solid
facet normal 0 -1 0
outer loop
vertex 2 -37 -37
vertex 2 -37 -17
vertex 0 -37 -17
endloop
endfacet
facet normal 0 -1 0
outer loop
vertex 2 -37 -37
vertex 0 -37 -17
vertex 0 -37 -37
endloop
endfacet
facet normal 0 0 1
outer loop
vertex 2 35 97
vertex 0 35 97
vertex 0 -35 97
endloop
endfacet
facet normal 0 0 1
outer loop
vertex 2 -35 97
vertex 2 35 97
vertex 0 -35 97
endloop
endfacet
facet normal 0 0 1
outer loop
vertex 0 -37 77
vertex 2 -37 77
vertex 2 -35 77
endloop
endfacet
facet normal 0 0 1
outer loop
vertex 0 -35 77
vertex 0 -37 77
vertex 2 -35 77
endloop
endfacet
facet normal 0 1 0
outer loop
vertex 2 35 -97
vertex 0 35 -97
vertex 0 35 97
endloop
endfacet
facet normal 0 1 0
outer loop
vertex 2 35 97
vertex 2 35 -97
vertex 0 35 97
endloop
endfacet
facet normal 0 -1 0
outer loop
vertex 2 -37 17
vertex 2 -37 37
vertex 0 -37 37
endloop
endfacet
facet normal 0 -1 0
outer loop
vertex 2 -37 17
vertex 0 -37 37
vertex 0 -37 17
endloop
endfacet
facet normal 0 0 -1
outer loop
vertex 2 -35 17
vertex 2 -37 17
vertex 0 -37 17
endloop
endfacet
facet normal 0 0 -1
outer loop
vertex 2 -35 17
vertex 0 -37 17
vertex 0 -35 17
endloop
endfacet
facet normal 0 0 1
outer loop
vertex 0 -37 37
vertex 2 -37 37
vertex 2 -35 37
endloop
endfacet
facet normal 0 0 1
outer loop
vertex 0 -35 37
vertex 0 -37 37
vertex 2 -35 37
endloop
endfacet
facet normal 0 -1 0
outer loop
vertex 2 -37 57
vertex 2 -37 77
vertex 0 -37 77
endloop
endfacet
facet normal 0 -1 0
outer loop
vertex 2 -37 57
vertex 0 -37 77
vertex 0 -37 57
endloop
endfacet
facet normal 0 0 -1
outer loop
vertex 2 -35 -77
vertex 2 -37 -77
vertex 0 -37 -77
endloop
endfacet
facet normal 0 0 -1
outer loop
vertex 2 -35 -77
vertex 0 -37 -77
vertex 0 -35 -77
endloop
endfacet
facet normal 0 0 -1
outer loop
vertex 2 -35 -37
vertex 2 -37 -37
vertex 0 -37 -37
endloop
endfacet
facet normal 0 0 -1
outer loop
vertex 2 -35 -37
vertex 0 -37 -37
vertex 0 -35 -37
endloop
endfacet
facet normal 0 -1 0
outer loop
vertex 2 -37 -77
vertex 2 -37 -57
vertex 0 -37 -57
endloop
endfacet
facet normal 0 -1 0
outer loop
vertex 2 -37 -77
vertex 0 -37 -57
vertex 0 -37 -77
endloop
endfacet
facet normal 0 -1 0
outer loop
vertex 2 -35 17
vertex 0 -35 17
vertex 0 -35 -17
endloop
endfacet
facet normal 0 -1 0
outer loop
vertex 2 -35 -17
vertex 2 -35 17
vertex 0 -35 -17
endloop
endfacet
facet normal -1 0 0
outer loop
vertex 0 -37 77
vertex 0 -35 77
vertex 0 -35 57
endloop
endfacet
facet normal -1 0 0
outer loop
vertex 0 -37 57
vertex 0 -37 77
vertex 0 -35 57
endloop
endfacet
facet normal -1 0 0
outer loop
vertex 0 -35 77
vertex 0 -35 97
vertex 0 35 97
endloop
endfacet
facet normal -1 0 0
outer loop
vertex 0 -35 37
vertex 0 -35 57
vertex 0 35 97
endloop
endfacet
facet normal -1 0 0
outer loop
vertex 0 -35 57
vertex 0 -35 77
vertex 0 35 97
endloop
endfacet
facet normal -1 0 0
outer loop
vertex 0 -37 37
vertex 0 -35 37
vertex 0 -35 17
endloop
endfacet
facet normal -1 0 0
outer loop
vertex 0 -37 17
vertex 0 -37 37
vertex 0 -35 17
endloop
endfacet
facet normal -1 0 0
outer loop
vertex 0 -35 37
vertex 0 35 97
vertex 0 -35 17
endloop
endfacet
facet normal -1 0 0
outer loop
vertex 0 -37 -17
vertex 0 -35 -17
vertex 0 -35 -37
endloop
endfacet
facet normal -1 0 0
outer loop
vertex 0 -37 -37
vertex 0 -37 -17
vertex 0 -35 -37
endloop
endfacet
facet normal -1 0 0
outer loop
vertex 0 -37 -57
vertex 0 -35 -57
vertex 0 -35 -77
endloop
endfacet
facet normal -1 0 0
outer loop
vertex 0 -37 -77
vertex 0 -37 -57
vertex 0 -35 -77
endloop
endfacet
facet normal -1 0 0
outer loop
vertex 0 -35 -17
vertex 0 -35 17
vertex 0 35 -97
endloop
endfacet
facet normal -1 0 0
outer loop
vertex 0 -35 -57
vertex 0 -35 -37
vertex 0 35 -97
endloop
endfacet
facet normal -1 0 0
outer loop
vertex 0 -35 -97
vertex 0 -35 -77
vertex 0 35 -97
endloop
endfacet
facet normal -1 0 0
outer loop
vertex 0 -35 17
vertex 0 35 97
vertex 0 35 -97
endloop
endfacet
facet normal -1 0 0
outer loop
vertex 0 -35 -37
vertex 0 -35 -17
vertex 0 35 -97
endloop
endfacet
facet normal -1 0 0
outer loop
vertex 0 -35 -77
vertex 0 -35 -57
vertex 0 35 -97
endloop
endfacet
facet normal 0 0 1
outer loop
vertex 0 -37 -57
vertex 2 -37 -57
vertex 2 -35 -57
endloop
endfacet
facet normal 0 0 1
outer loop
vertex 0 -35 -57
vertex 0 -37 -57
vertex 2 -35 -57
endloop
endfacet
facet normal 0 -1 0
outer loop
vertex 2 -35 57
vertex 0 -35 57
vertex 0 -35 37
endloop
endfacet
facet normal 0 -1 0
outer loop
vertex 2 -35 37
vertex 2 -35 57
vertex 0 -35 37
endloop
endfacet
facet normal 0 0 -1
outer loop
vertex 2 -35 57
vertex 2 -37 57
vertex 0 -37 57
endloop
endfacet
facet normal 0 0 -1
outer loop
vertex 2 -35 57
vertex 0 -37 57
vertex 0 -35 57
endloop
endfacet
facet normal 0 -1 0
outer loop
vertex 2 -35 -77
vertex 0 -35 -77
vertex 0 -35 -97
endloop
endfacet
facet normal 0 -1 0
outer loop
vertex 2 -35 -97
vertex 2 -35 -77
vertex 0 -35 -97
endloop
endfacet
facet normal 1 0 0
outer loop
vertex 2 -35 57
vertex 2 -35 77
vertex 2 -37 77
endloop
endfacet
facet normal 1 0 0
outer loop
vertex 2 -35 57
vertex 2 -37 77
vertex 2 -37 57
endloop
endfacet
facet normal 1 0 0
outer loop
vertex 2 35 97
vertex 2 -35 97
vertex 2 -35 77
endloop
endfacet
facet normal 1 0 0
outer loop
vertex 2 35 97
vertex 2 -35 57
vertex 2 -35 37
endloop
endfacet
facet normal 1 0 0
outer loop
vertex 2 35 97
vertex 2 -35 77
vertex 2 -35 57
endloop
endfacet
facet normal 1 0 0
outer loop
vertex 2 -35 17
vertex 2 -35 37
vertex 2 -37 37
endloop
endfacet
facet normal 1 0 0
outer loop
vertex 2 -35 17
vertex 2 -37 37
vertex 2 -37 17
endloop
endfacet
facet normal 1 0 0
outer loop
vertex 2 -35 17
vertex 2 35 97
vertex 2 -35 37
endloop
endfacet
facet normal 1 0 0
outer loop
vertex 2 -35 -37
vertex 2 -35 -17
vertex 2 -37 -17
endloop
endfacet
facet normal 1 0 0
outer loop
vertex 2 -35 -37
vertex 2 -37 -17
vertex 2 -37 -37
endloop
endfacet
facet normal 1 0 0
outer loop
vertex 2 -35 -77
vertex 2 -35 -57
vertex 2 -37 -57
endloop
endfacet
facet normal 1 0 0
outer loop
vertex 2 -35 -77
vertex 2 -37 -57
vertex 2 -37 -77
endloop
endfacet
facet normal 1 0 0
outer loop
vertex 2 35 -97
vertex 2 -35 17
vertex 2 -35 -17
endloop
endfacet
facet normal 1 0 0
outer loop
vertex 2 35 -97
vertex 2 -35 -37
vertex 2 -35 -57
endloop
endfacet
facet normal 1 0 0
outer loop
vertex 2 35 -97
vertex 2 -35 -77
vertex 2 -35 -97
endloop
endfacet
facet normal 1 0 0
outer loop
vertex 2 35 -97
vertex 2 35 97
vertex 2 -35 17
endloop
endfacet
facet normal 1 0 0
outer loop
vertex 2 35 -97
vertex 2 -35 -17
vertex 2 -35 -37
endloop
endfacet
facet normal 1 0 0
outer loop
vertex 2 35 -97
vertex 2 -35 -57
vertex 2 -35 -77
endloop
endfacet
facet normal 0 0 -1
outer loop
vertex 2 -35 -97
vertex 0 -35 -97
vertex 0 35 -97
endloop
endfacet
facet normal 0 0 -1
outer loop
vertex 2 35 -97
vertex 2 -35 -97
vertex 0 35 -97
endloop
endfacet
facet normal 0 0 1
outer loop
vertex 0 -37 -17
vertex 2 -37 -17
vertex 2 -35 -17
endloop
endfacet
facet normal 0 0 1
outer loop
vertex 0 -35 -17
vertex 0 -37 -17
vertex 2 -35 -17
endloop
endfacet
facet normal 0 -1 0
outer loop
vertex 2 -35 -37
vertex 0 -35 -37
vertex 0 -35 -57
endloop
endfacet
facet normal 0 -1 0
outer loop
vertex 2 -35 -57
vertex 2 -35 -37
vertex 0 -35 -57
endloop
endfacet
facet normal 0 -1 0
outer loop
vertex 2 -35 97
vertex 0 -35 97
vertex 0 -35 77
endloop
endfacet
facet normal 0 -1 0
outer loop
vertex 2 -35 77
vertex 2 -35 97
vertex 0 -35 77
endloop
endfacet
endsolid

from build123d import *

# Parameters (mm, degrees)
BOSS_EXTRUDE1_DEPTH = 2
SKETCH2_W           = 2
SKETCH2_H           = 20
CUT_EXTRUDE1_DEPTH  = 10
SKETCH3_W           = 20
SKETCH3_H           = 2
BOSS_EXTRUDE2_DEPTH = 2


with BuildPart() as part:
    # Sketch1 → Boss-Extrude1 (new body)
    with BuildSketch(Plane(origin=(0, 0, 0), x_dir=(0, 0, -1), z_dir=(1, 0, 0))):
        Polygon((-97, -35), (97, -35), (97, 0), (99, 0), (99, 20), (97, 20), (97, 35), (-97, 35), (-97, 20), (-99, 20), (-99, 0), (-97, 0), align=None)
    extrude(amount=BOSS_EXTRUDE1_DEPTH)

    # Sketch2 → Cut-Extrude1 (cut)
    with BuildSketch(Plane(origin=(2, 0, 0), x_dir=(0, 0, -1), z_dir=(1, 0, 0))):
        with Locations((-98, 10)):
            Rectangle(SKETCH2_W, SKETCH2_H)
        with Locations((98, 10)):
            Rectangle(SKETCH2_W, SKETCH2_H)
    extrude(amount=-CUT_EXTRUDE1_DEPTH, mode=Mode.SUBTRACT)

    # Sketch3 → Boss-Extrude2 (add)
    with BuildSketch(Plane(origin=(2, 0, 0), x_dir=(0, 0, -1), z_dir=(1, 0, 0))):
        with Locations((-67, -36)):
            Rectangle(SKETCH3_W, SKETCH3_H)
        with Locations((-27, -36)):
            Rectangle(SKETCH3_W, SKETCH3_H)
        with Locations((27, -36)):
            Rectangle(SKETCH3_W, SKETCH3_H)
        with Locations((67, -36)):
            Rectangle(SKETCH3_W, SKETCH3_H)
    extrude(amount=-BOSS_EXTRUDE2_DEPTH)


solid = part.part
